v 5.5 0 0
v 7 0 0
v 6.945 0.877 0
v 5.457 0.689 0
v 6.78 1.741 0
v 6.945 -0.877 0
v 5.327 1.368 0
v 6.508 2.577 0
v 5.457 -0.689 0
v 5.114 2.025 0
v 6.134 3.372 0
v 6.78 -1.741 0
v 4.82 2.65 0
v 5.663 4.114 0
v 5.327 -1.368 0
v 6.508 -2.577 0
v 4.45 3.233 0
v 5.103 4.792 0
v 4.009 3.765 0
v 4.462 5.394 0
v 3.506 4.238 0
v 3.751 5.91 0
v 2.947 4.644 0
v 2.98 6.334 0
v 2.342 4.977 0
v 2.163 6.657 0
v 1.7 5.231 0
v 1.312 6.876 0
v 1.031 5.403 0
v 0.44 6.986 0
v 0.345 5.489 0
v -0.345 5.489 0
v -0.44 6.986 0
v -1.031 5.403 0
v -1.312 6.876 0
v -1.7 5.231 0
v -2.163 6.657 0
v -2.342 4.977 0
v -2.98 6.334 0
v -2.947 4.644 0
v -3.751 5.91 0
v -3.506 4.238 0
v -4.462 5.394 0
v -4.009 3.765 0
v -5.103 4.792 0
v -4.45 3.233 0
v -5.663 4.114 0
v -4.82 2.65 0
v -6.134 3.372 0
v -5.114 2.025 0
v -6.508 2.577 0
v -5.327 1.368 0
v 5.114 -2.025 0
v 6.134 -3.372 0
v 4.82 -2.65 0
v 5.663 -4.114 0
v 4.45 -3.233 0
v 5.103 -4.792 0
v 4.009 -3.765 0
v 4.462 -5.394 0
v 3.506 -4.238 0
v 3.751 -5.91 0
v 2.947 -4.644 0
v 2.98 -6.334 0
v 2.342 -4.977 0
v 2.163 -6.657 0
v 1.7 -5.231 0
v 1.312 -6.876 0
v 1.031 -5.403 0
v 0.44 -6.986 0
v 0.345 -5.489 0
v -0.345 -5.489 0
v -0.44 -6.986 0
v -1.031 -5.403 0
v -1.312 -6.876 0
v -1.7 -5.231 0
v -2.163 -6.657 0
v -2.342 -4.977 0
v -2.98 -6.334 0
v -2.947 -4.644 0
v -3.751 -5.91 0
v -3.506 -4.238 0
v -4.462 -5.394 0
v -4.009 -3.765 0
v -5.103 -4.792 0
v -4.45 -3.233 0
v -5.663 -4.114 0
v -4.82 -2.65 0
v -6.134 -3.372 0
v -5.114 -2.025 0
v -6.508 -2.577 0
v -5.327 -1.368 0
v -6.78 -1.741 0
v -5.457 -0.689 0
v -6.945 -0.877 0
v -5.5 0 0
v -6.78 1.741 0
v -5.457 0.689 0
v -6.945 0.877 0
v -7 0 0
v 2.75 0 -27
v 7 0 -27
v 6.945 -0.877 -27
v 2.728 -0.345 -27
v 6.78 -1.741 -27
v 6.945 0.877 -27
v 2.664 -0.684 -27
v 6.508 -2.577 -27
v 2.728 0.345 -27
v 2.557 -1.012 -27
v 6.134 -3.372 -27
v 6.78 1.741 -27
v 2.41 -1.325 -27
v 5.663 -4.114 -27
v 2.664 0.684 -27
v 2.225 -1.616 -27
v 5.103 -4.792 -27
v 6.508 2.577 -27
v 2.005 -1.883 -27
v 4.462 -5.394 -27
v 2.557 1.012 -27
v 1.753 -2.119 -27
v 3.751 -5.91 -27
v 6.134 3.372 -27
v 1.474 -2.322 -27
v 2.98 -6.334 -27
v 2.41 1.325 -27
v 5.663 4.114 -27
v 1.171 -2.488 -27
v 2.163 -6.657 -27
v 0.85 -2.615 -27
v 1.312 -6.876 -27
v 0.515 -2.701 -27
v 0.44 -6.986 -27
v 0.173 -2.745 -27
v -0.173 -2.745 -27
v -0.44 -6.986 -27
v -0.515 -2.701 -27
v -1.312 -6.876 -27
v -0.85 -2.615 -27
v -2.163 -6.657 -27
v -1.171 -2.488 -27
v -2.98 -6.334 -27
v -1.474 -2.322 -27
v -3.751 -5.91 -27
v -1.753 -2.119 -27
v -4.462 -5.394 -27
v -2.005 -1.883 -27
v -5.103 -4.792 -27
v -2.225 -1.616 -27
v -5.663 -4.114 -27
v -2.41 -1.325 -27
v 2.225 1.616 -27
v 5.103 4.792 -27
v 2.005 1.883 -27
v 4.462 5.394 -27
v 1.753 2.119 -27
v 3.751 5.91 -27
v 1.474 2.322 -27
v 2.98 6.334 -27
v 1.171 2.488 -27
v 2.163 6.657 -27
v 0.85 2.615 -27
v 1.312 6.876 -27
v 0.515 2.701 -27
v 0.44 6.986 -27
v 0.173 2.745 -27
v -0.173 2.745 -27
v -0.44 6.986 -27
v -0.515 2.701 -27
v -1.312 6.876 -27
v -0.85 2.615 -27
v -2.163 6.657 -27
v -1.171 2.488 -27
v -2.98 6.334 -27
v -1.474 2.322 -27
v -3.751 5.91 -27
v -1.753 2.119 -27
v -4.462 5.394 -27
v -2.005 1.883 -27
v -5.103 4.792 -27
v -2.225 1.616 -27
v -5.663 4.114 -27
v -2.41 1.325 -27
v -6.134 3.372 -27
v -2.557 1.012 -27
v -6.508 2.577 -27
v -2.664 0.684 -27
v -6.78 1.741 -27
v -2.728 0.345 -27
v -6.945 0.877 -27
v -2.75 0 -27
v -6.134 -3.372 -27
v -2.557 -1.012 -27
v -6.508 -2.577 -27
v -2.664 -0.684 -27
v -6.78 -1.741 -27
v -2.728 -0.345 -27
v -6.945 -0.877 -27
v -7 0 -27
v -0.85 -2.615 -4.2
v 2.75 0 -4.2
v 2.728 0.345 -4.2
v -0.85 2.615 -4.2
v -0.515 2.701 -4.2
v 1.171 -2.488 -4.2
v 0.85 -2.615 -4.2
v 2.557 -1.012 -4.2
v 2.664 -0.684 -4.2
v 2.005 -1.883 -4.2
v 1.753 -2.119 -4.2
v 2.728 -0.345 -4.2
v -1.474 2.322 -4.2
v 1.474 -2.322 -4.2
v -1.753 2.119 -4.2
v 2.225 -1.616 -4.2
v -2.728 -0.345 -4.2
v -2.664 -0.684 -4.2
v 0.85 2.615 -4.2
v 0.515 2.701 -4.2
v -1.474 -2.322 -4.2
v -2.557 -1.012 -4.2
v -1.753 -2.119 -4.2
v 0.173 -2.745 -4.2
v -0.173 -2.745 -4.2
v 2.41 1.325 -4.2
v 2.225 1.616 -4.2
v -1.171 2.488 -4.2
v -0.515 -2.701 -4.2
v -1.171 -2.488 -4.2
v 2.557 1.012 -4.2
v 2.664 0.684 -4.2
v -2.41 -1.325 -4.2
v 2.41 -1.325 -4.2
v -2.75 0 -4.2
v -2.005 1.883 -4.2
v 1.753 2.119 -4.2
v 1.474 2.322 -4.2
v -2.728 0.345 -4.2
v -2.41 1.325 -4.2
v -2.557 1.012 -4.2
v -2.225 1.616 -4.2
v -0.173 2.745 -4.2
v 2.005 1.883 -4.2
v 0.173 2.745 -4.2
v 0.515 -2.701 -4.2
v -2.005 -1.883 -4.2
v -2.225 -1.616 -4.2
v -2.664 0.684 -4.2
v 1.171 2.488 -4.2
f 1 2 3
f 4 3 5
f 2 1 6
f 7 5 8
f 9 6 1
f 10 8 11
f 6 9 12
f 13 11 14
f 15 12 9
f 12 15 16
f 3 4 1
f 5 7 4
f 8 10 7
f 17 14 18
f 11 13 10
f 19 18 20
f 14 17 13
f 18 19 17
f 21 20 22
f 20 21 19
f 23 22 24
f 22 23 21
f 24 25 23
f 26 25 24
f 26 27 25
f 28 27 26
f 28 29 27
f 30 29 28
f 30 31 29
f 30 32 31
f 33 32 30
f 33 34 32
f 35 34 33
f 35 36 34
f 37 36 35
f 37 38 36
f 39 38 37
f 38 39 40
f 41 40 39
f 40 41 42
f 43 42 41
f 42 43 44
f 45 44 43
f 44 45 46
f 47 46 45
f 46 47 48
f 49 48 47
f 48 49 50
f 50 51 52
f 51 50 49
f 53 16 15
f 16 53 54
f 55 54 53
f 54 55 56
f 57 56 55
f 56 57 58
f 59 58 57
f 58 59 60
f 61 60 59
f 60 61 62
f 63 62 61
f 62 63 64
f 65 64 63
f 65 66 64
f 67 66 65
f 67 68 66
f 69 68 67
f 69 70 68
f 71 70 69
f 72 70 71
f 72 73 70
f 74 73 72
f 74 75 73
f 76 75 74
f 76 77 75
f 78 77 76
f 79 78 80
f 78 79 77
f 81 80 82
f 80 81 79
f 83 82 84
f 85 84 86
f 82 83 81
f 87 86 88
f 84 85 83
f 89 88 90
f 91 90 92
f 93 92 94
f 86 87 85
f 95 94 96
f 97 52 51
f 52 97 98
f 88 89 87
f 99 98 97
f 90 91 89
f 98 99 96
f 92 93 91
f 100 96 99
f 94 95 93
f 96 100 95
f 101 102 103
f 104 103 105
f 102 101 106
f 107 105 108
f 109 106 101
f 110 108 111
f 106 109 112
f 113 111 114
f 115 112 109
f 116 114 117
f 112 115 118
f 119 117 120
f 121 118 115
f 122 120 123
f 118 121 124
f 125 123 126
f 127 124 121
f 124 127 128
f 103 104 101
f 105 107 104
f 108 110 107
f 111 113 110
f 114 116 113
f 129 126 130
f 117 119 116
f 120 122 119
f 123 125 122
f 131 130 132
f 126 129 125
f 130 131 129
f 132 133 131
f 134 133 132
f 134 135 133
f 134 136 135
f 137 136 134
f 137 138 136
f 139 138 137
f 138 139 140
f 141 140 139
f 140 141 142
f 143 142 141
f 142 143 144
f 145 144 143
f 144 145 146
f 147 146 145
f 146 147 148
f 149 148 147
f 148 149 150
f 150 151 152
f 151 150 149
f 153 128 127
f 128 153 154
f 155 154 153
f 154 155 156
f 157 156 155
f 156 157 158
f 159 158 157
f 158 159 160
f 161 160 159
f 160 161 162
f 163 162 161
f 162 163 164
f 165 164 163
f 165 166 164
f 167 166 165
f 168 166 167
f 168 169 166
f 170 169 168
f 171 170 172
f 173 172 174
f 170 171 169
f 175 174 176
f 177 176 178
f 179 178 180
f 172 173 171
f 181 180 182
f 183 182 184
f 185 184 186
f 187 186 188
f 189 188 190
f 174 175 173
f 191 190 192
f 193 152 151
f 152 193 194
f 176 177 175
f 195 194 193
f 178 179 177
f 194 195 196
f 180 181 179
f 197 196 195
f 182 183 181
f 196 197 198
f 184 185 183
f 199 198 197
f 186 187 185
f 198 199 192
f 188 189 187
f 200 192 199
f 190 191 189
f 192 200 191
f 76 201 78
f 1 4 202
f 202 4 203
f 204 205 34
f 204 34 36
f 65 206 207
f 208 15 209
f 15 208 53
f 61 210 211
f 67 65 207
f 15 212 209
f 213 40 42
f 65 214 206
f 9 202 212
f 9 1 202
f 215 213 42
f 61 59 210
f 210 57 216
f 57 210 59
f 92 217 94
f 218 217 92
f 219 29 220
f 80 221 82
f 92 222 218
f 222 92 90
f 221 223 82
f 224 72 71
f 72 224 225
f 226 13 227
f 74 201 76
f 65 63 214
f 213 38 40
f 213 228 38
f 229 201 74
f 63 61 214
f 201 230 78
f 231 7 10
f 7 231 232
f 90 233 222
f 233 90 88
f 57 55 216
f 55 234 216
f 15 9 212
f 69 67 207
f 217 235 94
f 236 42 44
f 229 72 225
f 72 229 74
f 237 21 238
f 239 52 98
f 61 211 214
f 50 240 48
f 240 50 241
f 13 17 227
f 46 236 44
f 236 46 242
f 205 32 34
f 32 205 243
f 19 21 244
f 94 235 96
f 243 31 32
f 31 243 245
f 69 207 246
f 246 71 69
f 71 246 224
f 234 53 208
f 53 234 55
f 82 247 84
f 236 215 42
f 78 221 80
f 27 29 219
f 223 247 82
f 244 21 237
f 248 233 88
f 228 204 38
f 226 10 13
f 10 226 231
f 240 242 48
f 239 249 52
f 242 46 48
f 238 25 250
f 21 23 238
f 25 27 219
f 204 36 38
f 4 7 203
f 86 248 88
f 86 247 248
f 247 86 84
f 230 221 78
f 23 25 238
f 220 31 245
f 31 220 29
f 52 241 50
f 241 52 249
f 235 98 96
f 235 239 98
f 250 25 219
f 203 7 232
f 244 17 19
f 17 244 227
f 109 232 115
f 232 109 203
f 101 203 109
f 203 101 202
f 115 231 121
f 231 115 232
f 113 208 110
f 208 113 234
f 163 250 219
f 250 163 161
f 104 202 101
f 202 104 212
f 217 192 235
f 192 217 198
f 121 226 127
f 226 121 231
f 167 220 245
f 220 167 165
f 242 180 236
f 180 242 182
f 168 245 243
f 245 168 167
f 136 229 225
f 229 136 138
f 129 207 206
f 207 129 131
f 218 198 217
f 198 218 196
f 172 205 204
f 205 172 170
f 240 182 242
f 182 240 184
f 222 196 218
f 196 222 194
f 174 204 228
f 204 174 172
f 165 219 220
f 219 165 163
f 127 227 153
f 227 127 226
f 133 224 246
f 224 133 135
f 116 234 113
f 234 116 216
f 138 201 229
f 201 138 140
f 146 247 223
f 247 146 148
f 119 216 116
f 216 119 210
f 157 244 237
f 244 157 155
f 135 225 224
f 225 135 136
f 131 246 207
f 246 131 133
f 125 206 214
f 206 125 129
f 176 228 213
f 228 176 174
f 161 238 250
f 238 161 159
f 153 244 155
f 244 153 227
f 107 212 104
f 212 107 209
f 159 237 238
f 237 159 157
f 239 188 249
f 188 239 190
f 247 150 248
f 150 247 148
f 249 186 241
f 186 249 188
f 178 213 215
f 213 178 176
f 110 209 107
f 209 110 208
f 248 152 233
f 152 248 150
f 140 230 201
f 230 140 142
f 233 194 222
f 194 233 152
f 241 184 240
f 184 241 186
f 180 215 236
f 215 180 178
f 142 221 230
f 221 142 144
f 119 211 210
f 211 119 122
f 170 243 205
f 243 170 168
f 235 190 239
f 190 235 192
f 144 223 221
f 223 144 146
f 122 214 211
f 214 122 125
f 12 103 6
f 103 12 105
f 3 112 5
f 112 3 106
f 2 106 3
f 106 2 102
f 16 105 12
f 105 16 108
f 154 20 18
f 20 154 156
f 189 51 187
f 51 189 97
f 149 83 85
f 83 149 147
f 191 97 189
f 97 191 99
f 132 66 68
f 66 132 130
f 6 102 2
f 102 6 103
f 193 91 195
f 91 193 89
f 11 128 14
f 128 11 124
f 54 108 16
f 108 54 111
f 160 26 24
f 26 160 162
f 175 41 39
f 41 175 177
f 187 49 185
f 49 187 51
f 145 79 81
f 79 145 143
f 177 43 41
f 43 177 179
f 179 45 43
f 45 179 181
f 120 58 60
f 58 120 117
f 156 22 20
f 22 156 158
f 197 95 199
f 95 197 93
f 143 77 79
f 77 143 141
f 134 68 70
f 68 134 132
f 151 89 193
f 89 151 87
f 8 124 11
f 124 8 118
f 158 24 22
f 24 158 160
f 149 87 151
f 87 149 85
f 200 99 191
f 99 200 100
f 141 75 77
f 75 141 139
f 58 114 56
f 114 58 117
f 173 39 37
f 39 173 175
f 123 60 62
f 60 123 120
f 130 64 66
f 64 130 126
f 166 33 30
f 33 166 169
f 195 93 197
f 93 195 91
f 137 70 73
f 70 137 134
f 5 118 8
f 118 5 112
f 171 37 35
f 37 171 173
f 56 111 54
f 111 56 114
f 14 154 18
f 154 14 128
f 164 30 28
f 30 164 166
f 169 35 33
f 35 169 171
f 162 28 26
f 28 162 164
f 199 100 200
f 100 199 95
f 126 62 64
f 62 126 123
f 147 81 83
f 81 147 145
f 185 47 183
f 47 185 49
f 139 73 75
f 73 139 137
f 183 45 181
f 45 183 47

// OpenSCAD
$fn = 50;


difference() {
	union() {
		translate(v = [0, 0, -27.0000000000]) {
			cylinder(h = 27, r = 7.0000000000);
		}
		cylinder(h = 0, r = 17.0000000000);
	}
	union() {
		translate(v = [0, 0, 0]) {
			rotate(a = [0, 0, 0]) {
				difference() {
					union() {
						#translate(v = [0, 0, -27.0000000000]) {
							cylinder(h = 27, r = 2.2500000000);
						}
						#translate(v = [0, 0, -4.2000000000]) {
							cylinder(h = 4.2000000000, r = 7.0000000000, r1 = 2.7500000000, r2 = 5.5000000000);
						}
						#translate(v = [0, 0, -27.0000000000]) {
							cylinder(h = 27, r = 2.7500000000);
						}
						#translate(v = [0, 0, -27.0000000000]) {
							cylinder(h = 27, r = 2.2500000000);
						}
					}
					union();
				}
			}
		}
	}
}
